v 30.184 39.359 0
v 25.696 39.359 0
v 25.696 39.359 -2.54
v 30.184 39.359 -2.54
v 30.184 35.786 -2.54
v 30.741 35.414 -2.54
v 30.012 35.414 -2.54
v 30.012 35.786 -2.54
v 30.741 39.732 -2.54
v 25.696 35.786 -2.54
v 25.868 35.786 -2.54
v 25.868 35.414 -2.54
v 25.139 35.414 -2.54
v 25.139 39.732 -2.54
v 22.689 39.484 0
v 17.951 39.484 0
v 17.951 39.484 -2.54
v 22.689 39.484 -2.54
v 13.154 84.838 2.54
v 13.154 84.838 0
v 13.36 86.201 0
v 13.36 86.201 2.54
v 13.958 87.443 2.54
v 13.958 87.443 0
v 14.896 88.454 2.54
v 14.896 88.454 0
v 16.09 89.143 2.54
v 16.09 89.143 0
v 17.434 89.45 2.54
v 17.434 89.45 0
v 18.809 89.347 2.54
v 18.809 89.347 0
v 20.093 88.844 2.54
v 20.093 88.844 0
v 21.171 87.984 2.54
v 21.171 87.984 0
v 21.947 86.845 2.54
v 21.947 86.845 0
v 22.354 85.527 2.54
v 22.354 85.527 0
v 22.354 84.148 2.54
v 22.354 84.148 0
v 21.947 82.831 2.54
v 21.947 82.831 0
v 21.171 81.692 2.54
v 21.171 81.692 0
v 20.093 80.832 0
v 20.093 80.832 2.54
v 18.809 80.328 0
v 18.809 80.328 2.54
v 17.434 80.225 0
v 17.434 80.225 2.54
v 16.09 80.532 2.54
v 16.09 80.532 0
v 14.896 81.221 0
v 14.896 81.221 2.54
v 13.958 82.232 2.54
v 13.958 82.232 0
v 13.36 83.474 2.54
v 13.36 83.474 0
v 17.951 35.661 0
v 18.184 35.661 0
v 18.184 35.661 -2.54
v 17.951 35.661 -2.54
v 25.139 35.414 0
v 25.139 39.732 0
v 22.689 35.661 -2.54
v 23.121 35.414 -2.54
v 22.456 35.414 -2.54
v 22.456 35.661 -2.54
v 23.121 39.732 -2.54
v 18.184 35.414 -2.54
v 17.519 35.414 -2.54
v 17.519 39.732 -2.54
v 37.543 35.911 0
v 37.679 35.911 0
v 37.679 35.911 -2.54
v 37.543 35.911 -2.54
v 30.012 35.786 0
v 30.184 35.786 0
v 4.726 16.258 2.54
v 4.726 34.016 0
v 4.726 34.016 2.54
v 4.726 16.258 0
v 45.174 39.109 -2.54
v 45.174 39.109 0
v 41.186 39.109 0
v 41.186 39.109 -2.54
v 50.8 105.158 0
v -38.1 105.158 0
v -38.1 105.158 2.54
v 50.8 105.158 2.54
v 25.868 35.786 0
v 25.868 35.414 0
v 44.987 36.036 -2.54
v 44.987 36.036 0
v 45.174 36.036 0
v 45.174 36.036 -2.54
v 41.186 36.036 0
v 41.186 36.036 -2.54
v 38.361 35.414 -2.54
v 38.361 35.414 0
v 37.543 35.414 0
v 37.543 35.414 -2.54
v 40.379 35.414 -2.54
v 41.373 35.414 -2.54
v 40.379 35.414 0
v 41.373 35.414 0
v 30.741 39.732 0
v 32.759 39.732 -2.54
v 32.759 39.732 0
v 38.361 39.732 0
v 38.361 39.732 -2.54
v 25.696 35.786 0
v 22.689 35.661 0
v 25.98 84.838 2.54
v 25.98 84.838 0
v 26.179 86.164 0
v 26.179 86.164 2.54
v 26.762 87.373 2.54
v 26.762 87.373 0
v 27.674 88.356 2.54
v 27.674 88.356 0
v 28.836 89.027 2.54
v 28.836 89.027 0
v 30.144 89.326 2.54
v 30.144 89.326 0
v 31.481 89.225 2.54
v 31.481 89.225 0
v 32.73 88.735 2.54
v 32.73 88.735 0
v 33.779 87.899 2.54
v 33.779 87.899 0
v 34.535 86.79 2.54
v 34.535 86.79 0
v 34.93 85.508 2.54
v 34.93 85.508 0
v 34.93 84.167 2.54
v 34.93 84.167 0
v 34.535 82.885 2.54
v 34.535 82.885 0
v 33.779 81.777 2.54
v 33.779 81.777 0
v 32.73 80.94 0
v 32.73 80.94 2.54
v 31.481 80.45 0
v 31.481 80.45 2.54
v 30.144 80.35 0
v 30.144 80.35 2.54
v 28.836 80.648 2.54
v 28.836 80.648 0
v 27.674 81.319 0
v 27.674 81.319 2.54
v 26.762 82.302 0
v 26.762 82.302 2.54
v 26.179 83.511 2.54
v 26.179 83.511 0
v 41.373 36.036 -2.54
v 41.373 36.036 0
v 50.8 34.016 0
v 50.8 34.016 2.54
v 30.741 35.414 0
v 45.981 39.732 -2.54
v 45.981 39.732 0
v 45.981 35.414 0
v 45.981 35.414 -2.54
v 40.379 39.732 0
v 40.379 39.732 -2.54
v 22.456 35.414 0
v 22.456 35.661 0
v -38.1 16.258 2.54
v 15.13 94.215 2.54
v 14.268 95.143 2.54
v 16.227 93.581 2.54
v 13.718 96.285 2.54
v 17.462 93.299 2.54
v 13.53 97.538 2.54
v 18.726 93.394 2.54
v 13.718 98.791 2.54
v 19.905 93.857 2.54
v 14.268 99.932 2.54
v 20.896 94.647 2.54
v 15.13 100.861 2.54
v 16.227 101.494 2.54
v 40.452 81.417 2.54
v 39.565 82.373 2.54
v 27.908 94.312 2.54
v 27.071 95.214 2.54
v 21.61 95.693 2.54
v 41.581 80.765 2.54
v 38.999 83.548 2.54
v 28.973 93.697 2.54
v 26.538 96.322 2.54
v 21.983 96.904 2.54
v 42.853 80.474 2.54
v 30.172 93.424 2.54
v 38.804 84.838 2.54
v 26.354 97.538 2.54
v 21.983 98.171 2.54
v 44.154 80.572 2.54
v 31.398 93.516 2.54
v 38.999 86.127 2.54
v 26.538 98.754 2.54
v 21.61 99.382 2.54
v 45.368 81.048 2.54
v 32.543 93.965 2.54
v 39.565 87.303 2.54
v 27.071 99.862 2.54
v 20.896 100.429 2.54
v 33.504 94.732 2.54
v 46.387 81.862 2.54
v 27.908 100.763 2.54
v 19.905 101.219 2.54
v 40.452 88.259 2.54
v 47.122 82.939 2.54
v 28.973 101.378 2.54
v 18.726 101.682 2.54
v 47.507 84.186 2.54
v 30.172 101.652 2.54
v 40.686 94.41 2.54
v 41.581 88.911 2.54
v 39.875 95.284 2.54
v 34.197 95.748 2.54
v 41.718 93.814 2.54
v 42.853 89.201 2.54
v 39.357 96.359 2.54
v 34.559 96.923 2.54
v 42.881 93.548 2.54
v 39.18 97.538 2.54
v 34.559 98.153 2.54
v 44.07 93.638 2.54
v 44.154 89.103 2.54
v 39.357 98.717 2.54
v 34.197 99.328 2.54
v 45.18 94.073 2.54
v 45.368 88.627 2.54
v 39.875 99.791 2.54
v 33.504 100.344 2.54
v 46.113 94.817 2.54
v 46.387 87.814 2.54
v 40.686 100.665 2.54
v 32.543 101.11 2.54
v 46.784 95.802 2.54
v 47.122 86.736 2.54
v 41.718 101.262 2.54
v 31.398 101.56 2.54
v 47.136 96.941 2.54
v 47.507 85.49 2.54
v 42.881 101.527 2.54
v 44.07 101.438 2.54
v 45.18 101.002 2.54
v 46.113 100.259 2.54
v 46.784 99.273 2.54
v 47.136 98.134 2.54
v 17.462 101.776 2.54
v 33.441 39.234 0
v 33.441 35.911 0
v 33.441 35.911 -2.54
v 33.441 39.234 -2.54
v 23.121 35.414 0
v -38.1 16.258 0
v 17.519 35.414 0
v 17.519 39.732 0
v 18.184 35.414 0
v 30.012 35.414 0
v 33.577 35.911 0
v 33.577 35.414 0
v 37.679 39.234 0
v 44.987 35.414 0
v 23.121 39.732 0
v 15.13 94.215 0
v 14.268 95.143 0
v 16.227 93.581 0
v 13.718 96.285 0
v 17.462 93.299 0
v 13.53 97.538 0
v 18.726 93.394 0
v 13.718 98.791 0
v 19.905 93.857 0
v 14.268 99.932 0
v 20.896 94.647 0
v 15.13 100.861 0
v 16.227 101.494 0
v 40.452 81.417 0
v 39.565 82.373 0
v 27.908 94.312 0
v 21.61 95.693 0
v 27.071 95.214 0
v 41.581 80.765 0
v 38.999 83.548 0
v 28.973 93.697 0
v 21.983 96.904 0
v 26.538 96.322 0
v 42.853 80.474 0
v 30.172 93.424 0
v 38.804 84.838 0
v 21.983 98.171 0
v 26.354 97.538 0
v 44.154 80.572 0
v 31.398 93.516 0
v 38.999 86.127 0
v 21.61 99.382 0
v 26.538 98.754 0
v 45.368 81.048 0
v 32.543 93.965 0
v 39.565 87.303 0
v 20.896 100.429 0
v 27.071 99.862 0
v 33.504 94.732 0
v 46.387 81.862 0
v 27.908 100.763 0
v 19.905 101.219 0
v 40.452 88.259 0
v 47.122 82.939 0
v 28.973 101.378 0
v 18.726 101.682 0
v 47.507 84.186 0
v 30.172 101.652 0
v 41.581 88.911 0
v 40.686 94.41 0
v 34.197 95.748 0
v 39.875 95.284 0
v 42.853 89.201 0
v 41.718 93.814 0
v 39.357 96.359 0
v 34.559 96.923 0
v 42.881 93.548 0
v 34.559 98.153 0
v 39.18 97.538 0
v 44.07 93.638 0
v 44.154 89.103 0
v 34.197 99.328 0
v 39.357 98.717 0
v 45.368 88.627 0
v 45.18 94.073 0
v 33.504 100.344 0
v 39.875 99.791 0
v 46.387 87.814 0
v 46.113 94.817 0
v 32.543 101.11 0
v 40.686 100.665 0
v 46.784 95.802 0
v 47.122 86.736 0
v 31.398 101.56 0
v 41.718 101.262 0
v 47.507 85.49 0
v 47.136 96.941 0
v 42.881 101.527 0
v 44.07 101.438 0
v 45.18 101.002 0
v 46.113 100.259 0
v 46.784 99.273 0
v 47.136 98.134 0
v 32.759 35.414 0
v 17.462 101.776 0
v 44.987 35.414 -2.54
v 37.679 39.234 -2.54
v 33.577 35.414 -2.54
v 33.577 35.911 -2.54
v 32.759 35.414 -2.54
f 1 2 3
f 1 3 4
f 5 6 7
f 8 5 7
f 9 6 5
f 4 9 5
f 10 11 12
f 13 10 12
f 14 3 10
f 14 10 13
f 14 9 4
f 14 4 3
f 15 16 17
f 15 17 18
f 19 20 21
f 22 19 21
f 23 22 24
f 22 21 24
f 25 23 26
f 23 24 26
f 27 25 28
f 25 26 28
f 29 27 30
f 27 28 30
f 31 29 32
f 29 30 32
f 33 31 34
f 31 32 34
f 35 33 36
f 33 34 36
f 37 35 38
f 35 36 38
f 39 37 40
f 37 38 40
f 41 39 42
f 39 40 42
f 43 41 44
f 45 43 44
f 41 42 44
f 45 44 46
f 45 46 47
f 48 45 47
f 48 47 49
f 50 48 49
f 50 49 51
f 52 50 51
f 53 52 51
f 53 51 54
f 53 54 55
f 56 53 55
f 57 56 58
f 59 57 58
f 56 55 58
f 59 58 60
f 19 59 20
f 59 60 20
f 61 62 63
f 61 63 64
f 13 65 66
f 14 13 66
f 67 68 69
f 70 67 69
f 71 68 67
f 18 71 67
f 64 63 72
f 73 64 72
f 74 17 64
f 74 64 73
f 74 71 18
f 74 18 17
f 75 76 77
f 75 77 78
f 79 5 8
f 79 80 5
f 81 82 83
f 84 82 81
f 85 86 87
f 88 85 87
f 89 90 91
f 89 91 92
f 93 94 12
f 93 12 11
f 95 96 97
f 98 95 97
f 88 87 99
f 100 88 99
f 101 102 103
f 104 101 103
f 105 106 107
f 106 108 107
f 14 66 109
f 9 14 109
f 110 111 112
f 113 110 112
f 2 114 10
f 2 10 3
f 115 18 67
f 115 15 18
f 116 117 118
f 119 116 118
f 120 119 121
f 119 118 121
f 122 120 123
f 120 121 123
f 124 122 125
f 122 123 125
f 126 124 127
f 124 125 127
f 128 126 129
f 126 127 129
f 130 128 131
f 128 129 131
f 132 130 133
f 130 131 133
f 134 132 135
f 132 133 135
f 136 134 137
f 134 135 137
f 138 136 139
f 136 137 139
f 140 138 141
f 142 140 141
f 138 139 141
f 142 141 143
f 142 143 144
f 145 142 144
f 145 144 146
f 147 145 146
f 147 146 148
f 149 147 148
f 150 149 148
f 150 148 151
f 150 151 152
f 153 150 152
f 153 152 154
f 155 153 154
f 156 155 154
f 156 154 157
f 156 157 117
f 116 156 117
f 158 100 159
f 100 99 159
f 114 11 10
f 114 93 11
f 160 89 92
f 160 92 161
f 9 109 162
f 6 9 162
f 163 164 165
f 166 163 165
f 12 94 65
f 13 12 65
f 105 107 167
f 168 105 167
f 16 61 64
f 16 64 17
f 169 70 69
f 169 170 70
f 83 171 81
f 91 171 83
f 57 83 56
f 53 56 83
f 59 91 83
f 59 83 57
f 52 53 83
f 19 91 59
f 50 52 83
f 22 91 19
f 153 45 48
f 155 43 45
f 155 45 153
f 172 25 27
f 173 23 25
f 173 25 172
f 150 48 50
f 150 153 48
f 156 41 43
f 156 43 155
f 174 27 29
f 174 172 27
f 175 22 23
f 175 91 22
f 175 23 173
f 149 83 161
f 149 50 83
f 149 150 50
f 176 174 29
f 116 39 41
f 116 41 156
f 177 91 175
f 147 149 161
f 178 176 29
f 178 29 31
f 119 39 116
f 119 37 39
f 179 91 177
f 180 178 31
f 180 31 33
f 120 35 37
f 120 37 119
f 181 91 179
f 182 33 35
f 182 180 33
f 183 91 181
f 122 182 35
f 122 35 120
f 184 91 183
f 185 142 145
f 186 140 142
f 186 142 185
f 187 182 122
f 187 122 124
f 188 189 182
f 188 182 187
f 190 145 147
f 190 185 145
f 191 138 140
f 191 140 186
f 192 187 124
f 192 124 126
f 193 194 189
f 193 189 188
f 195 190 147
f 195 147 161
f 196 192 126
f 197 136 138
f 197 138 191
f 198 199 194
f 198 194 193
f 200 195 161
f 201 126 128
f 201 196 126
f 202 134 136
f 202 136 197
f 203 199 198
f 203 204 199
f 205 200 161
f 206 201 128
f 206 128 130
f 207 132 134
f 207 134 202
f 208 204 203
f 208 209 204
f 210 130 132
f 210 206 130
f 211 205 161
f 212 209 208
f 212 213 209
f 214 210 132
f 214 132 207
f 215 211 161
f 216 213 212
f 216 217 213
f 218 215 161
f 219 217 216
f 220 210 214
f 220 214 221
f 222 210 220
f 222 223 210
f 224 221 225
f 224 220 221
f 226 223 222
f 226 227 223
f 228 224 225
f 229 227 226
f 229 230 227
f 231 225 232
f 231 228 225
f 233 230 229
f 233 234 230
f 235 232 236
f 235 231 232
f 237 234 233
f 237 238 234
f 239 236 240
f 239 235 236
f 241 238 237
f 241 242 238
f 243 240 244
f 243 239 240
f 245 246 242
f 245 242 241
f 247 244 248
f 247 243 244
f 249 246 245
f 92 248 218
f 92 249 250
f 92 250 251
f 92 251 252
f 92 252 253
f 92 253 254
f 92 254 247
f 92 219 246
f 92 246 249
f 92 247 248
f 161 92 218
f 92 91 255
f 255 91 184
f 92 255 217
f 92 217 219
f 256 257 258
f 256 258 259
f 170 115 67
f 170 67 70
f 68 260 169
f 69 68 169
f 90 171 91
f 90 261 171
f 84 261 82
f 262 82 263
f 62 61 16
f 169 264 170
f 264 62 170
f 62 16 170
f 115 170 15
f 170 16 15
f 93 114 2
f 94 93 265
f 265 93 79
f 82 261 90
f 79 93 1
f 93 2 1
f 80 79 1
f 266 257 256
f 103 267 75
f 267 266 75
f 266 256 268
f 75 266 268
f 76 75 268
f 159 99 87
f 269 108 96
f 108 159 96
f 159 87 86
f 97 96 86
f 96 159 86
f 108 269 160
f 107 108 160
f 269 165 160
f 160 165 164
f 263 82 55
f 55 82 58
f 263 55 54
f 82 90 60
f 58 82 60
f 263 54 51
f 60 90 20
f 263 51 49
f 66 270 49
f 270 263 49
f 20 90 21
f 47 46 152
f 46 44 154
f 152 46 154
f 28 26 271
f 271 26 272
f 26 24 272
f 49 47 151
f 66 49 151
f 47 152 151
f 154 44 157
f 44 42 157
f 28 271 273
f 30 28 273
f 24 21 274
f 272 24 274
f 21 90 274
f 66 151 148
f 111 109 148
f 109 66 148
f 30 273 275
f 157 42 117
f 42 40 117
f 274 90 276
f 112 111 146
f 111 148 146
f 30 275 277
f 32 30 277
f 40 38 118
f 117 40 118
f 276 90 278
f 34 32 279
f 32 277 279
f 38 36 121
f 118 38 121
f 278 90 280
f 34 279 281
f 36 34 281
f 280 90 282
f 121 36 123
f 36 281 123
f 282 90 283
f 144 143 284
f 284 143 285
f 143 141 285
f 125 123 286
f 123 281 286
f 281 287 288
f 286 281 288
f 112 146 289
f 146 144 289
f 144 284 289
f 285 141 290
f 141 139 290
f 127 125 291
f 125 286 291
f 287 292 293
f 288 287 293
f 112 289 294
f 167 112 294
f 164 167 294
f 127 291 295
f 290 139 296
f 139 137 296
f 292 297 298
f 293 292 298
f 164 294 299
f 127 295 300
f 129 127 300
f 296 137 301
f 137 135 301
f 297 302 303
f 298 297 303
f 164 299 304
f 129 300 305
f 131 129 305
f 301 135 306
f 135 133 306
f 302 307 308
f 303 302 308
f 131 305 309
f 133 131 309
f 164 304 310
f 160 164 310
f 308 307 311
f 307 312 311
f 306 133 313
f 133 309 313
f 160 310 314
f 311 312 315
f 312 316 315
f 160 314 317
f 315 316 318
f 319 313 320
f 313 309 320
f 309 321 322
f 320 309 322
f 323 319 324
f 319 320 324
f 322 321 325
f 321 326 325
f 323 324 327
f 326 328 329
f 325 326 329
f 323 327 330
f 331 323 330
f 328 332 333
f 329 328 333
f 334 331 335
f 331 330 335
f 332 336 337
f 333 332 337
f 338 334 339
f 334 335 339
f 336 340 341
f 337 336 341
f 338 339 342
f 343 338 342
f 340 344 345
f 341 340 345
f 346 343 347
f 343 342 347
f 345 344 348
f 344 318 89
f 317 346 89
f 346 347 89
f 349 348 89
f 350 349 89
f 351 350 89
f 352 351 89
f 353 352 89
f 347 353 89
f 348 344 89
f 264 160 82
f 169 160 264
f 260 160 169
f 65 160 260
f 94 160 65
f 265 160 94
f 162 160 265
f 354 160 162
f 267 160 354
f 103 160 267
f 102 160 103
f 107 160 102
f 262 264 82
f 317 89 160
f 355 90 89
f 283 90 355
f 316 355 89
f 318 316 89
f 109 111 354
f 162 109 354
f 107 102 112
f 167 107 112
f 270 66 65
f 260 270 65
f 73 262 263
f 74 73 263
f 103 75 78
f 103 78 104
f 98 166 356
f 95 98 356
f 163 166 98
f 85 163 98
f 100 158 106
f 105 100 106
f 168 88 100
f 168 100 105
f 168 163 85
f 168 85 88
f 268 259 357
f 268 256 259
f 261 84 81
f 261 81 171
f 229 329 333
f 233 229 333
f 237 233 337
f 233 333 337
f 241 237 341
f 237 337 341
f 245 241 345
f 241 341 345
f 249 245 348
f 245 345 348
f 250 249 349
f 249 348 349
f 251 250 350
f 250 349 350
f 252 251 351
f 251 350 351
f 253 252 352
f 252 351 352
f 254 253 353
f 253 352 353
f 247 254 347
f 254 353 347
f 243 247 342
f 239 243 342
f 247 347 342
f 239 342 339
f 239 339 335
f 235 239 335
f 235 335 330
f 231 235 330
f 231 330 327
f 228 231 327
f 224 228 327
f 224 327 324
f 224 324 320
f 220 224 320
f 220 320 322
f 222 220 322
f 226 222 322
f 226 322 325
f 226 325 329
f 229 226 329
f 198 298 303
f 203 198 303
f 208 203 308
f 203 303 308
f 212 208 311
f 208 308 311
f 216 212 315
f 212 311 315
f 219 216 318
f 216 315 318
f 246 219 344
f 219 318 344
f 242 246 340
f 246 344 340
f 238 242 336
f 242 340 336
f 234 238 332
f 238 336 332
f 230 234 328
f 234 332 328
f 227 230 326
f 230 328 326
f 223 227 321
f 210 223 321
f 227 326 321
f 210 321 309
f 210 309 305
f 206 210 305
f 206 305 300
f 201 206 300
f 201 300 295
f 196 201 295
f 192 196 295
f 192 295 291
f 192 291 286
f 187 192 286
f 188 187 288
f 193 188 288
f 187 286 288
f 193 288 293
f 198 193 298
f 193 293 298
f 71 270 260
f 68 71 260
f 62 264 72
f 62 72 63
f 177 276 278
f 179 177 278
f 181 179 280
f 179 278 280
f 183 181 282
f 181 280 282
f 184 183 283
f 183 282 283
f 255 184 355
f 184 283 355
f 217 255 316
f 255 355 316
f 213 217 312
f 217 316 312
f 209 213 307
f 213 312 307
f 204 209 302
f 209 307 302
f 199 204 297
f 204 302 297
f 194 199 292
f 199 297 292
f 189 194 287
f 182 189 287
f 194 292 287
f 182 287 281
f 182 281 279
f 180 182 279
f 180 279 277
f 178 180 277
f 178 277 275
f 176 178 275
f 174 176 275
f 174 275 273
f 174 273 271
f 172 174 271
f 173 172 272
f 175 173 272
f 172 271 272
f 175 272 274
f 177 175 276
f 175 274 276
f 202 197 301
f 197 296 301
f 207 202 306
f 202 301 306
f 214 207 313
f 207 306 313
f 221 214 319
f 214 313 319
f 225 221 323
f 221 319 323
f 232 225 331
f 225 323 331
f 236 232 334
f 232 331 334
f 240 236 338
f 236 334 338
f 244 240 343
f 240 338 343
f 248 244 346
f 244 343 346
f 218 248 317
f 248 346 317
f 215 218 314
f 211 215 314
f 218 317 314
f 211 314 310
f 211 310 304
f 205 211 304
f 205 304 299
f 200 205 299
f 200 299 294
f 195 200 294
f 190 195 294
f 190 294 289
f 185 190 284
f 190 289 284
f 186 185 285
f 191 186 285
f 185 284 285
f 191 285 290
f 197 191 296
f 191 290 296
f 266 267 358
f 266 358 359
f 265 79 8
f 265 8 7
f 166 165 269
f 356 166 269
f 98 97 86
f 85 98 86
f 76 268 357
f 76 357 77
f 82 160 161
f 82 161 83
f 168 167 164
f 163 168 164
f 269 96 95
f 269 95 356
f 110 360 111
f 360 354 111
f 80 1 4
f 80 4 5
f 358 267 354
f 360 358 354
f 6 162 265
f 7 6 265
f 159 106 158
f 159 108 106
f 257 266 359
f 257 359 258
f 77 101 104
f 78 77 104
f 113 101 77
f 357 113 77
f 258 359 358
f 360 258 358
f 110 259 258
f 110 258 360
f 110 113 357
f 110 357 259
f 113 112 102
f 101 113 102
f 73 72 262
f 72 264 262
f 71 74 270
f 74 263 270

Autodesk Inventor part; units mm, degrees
ref_plane "YZ Plane" through (0, 0, 0) normal (1, 0, 0) x (0, 1, 0)
ref_plane "XZ Plane" through (0, 0, 0) normal (0, 1, 0) x (-1, 0, 0)
ref_plane "XY Plane" through (0, 0, 0) normal (0, 0, 1) x (1, 0, 0)
sketch "Sketch2" plane through (0, 0, 0) normal (0, 0, 1) x (1, 0, 0)
  line L0 (-38.1, 105.1577) -> (50.8, 105.1577)
  line L1 (50.8, 105.1577) -> (50.8, 16.2577)
  line L2 (50.8, 16.2577) -> (-38.1, 16.2577)
  line L3 (-38.1, 16.2577) -> (-38.1, 105.1577)
  point P0 (0, 0)
  dimension "d45" = 88.9
  dimension "d46" = 88.9
extrude "Extrusion1" add sketch "Sketch2" along normal blind 2.54
sketch "Sketch3" plane through (0, 0, 0) normal (0, 0, -1) x (-1, 0, 0)
  circle A0 centre (-43.18, 97.5377) radius 4.0005
  line L0 (-50.8, 16.2577) -> (-50.8, 105.1577) projected
  line L1 (-50.8, 105.1577) -> (38.1, 105.1577) projected
  circle A1 centre (-43.18, 97.5377) radius 5.2705
  line L2 (38.1, 105.1577) -> (38.1, 16.2577) projected
  line L3 (38.1, 16.2577) -> (-50.8, 16.2577) projected
  circle A2 centre (-43.18, 84.8377) radius 5.2705
  circle A3 centre (-30.48, 97.5377) radius 5.2705
  circle A4 centre (-30.48, 84.8377) radius 5.2705
  circle A5 centre (-17.78, 97.5377) radius 5.2705
  circle A6 centre (-17.78, 84.8377) radius 5.2705
  line L4 (-45.1739, 77.2092) -> (-41.1861, 77.2092)
  line L5 (-41.1861, 77.2092) -> (-41.1861, 74.1358)
  line L6 (-41.1861, 74.1358) -> (-45.1739, 74.1358)
  line L7 (-45.1739, 74.1358) -> (-45.1739, 77.2092)
  line L8 (-45.1739, 77.2092) -> (-41.1861, 74.1358) construction
  line L9 (-41.1861, 77.2092) -> (-45.1739, 74.1358) construction
  line L10 (-45.9813, 73.5135) -> (-40.3787, 73.5135)
  line L11 (-40.3787, 73.5135) -> (-40.3787, 77.8315)
  line L12 (-40.3787, 77.8315) -> (-45.9813, 77.8315)
  line L13 (-45.9813, 77.8315) -> (-45.9813, 73.5135)
  line L14 (-45.9813, 73.5135) -> (-40.3787, 77.8315) construction
  line L15 (-40.3787, 73.5135) -> (-45.9813, 77.8315) construction
  circle A7 centre (-30.48, 97.5377) radius 4.1255
  circle A8 centre (-17.78, 97.5377) radius 4.2505
  circle A9 centre (-43.18, 84.8377) radius 4.3755
  circle A10 centre (-30.48, 84.8377) radius 4.5005
  circle A11 centre (-17.78, 84.8377) radius 4.6255
  line L16 (-32.7587, 77.8315) -> (-38.3613, 77.8315)
  line L17 (-38.3613, 77.8315) -> (-38.3613, 73.5135)
  line L18 (-38.3613, 73.5135) -> (-32.7587, 73.5135)
  line L19 (-32.7587, 73.5135) -> (-32.7587, 77.8315)
  line L20 (-25.1387, 77.8315) -> (-30.7413, 77.8315)
  line L21 (-30.7413, 77.8315) -> (-30.7413, 73.5135)
  line L22 (-30.7413, 73.5135) -> (-25.1387, 73.5135)
  line L23 (-25.1387, 73.5135) -> (-25.1387, 77.8315)
  line L24 (-17.5187, 77.8315) -> (-23.1213, 77.8315)
  line L25 (-23.1213, 77.8315) -> (-23.1213, 73.5135)
  line L26 (-23.1213, 73.5135) -> (-17.5187, 73.5135)
  line L27 (-17.5187, 73.5135) -> (-17.5187, 77.8315)
  line L28 (-9.8987, 77.8315) -> (-15.5013, 77.8315)
  line L29 (-15.5013, 77.8315) -> (-15.5013, 73.5135)
  line L30 (-15.5013, 73.5135) -> (-9.8987, 73.5135)
  line L31 (-9.8987, 73.5135) -> (-9.8987, 77.8315)
  line L32 (-37.6789, 74.0108) -> (-33.4411, 74.0108)
  line L33 (-33.4411, 74.0108) -> (-33.4411, 77.3342)
  line L34 (-33.4411, 77.3342) -> (-37.6789, 77.3342)
  line L35 (-37.6789, 77.3342) -> (-37.6789, 74.0108)
  line L36 (-37.6789, 74.0108) -> (-33.4411, 77.3342) construction
  line L37 (-33.4411, 74.0108) -> (-37.6789, 77.3342) construction
  line L38 (-30.1839, 73.8858) -> (-25.6961, 73.8858)
  line L39 (-25.6961, 73.8858) -> (-25.6961, 77.4592)
  line L40 (-25.6961, 77.4592) -> (-30.1839, 77.4592)
  line L41 (-30.1839, 77.4592) -> (-30.1839, 73.8858)
  line L42 (-30.1839, 73.8858) -> (-25.6961, 77.4592) construction
  line L43 (-25.6961, 73.8858) -> (-30.1839, 77.4592) construction
  line L44 (-22.6889, 73.7608) -> (-17.9511, 73.7608)
  line L45 (-17.9511, 73.7608) -> (-17.9511, 77.5842)
  line L46 (-17.9511, 77.5842) -> (-22.6889, 77.5842)
  line L47 (-22.6889, 77.5842) -> (-22.6889, 73.7608)
  line L48 (-22.6889, 73.7608) -> (-17.9511, 77.5842) construction
  line L49 (-17.9511, 73.7608) -> (-22.6889, 77.5842) construction
  line L50 (-45.1739, 73.4552) -> (-41.1861, 73.4552)
  line L51 (-41.1861, 73.4552) -> (-41.1861, 74.8164)
  line L52 (-41.1861, 74.8164) -> (-45.1739, 74.8164)
  line L53 (-45.1739, 74.8164) -> (-45.1739, 73.4552)
  line L54 (-45.1739, 73.4552) -> (-41.1861, 74.8164) construction
  line L55 (-41.1861, 73.4552) -> (-45.1739, 74.8164) construction
  point P0 (0, 0)
  point P1 (-43.18, 75.6725)
  point P2 (-43.18, 75.6725)
  point P3 (-35.56, 75.6725)
  point P4 (-27.94, 75.6725)
  point P5 (-20.32, 75.6725)
  point P6 (-12.7, 75.6725)
  point P7 (-43.18, 74.1358)
  dimension "d49" = 7.62
  dimension "d50" = 7.62
  dimension "d51" = 1.27
  dimension "d56" = 12.7
  dimension "d59" = 12.7
  dimension "d64" = 3.9878
  dimension "d65" = 3.0734
  dimension "d66" = 9.1652
  dimension "d67" = 2.159
  dimension "d77" = 8.001
  dimension "d78" = 8.251
  dimension "d80" = 8.501
  dimension "d81" = 8.751
  dimension "d82" = 9.001
  dimension "d83" = 9.251
  dimension "d90" = 7.62
  dimension "d95" = 4.2378
  dimension "d96" = 4.4878
  dimension "d97" = 4.7378
  dimension "d98" = 3.3234
  dimension "d99" = 3.5734
sketch "Sketch4" plane through (0, 0, 0) normal (0, 0, -1) x (-1, 0, 0)
  line L0 (-50.8, 105.1577) -> (38.1, 105.1577) projected
  line L1 (-50.8, 16.2577) -> (-50.8, 105.1577) projected
  line L2 (-50.8, 105.1577) -> (-48.5295, 105.1577)
  line L3 (-48.5295, 105.1577) -> (-48.5295, 103.1024)
  line L4 (-48.5295, 103.1024) -> (-50.8, 103.1024)
  line L5 (-50.8, 103.1024) -> (-50.8, 105.1577)
  point P0 (0, 0)
extrude "Extrusion4" cut sketch "Sketch3" against normal blind 9.001 contours A0 | A7 | A8 | A9 | A10 | A11
sketch "Sketch5" plane through (0, 0, 0) normal (0, 0, -1) x (-1, 0, 0)
  line L0 (-45.1739, 39.1092) -> (-41.1861, 39.1092)
  line L1 (-41.1861, 39.1092) -> (-41.1861, 36.0358)
  line L2 (-41.1861, 36.0358) -> (-45.1739, 36.0358)
  line L3 (-45.1739, 36.0358) -> (-45.1739, 39.1092)
  line L4 (-45.1739, 39.1092) -> (-41.1861, 36.0358) construction
  line L5 (-41.1861, 39.1092) -> (-45.1739, 36.0358) construction
  line L6 (-45.9813, 35.4135) -> (-40.3787, 35.4135)
  line L7 (-40.3787, 35.4135) -> (-40.3787, 39.7315)
  line L8 (-40.3787, 39.7315) -> (-45.9813, 39.7315)
  line L9 (-45.9813, 39.7315) -> (-45.9813, 35.4135)
  line L10 (-45.9813, 35.4135) -> (-40.3787, 39.7315) construction
  line L11 (-40.3787, 35.4135) -> (-45.9813, 39.7315) construction
  line L12 (-32.7587, 39.7315) -> (-38.3613, 39.7315)
  line L13 (-38.3613, 39.7315) -> (-38.3613, 35.4135)
  line L14 (-38.3613, 35.4135) -> (-32.7587, 35.4135)
  line L15 (-32.7587, 35.4135) -> (-32.7587, 39.7315)
  line L16 (-25.1387, 39.7315) -> (-30.7413, 39.7315)
  line L17 (-30.7413, 39.7315) -> (-30.7413, 35.4135)
  line L18 (-30.7413, 35.4135) -> (-25.1387, 35.4135)
  line L19 (-25.1387, 35.4135) -> (-25.1387, 39.7315)
  line L20 (-17.5187, 39.7315) -> (-23.1213, 39.7315)
  line L21 (-23.1213, 39.7315) -> (-23.1213, 35.4135)
  line L22 (-23.1213, 35.4135) -> (-17.5187, 35.4135)
  line L23 (-17.5187, 35.4135) -> (-17.5187, 39.7315)
  line L24 (-9.8987, 39.7315) -> (-15.5013, 39.7315)
  line L25 (-15.5013, 39.7315) -> (-15.5013, 35.4135)
  line L26 (-15.5013, 35.4135) -> (-9.8987, 35.4135)
  line L27 (-37.6789, 35.9108) -> (-33.4411, 35.9108)
  line L28 (-33.4411, 35.9108) -> (-33.4411, 39.2342)
  line L29 (-33.4411, 39.2342) -> (-37.6789, 39.2342)
  line L30 (-37.6789, 39.2342) -> (-37.6789, 35.9108)
  line L31 (-37.6789, 35.9108) -> (-33.4411, 39.2342) construction
  line L32 (-33.4411, 35.9108) -> (-37.6789, 39.2342) construction
  line L33 (-30.1839, 35.7858) -> (-25.6961, 35.7858)
  line L34 (-25.6961, 35.7858) -> (-25.6961, 39.3592)
  line L35 (-25.6961, 39.3592) -> (-30.1839, 39.3592)
  line L36 (-30.1839, 39.3592) -> (-30.1839, 35.7858)
  line L37 (-30.1839, 35.7858) -> (-25.6961, 39.3592) construction
  line L38 (-25.6961, 35.7858) -> (-30.1839, 39.3592) construction
  line L39 (-22.6889, 35.6608) -> (-17.9511, 35.6608)
  line L40 (-17.9511, 35.6608) -> (-17.9511, 39.4842)
  line L41 (-17.9511, 39.4842) -> (-22.6889, 39.4842)
  line L42 (-22.6889, 39.4842) -> (-22.6889, 35.6608)
  line L43 (-22.6889, 35.6608) -> (-17.9511, 39.4842) construction
  line L44 (-17.9511, 35.6608) -> (-22.6889, 39.4842) construction
  line L45 (-45.1516, 35.2931) -> (-41.1861, 36.7869) construction
  line L46 (-41.1861, 35.3552) -> (-45.1739, 36.7164) construction
  line L47 (-44.9867, 35.3552) -> (-41.3733, 35.3552)
  line L48 (-41.3733, 35.3552) -> (-41.3733, 36.7164)
  line L49 (-41.3733, 36.7164) -> (-44.9867, 36.7164)
  line L50 (-44.9867, 36.7164) -> (-44.9867, 35.3552)
  line L51 (-44.9867, 35.3552) -> (-41.3733, 36.7164) construction
  line L52 (-41.3733, 35.3552) -> (-44.9867, 36.7164) construction
  line L53 (-37.5427, 35.3747) -> (-33.5773, 35.3747)
  line L54 (-33.5773, 35.3747) -> (-33.5773, 36.447)
  line L55 (-33.5773, 36.447) -> (-37.5427, 36.447)
  line L56 (-37.5427, 36.447) -> (-37.5427, 35.3747)
  line L57 (-37.5427, 35.3747) -> (-33.5773, 36.447) construction
  line L58 (-33.5773, 35.3747) -> (-37.5427, 36.447) construction
  line L59 (-30.0124, 35.3468) -> (-25.8676, 35.3468)
  line L60 (-25.8676, 35.3468) -> (-25.8676, 36.2248)
  line L61 (-25.8676, 36.2248) -> (-30.0124, 36.2248)
  line L62 (-30.0124, 36.2248) -> (-30.0124, 35.3468)
  line L63 (-30.0124, 35.3468) -> (-25.8676, 36.2248) construction
  line L64 (-25.8676, 35.3468) -> (-30.0124, 36.2248) construction
  line L65 (-22.4558, 35.2013) -> (-18.1842, 35.2013)
  line L66 (-18.1842, 35.2013) -> (-18.1842, 36.1203)
  line L67 (-18.1842, 36.1203) -> (-22.4558, 36.1203)
  line L68 (-22.4558, 36.1203) -> (-22.4558, 35.2013)
  line L69 (-22.4558, 35.2013) -> (-18.1842, 36.1203) construction
  line L70 (-18.1842, 35.2013) -> (-22.4558, 36.1203) construction
  point P0 (0, 0)
  point P1 (-43.18, 37.5725)
  point P2 (-43.18, 37.5725)
  point P3 (-35.56, 37.5725)
  point P4 (-27.94, 37.5725)
  point P5 (-20.32, 37.5725)
  point P6 (-12.7, 37.5725)
  point P7 (-43.18, 36.0358)
  point P8 (-35.56, 35.9108)
  point P9 (-27.94, 35.7858)
  point P10 (-20.32, 35.6608)
  point P11 (-22.4558, 35.4135)
  point P12 (-22.4558, 35.6608)
  point P13 (-18.1842, 35.6608)
  point P14 (-18.1842, 35.4135)
  point P15 (-30.0124, 35.4135)
  point P16 (-30.0124, 35.7858)
  point P17 (-25.8676, 35.7858)
  point P18 (-25.8676, 35.4135)
  point P19 (-37.5427, 35.4135)
  point P20 (-37.5427, 35.9108)
  point P21 (-33.5773, 35.9108)
  point P22 (-33.5773, 35.4135)
  point P23 (-44.9867, 35.4135)
  point P24 (-44.9867, 36.0358)
  point P25 (-41.3733, 36.0358)
  point P26 (-41.3733, 35.4135)
  dimension "d102" = 3.0734
  dimension "d103" = 2.159
  dimension "d104" = 7.62
  dimension "d105" = 4.2378
  dimension "d106" = 4.4878
  dimension "d107" = 4.7378
  dimension "d108" = 3.3234
  dimension "d109" = 3.5734
extrude "Extrusion5" add sketch "Sketch5" along normal blind 2.54 contours L3 L2 L50 L6 L9 L8 L7 L48 L1 L0 | L15 L14 L54 L27 L28 L29 L30 L56 L13 L12 | L19 L18 L60 L33 L34 L35 L36 L62 L17 L16 | L23 L22 L66 L39 L40 L41 L42 L68 L21 L20
sketch "Sketch6" plane through (0, 0, 0) normal (0, 0, -1) x (-1, 0, 0)
  line L0 (-52.3953, 34.0161) -> (-4.7261, 34.0161)
  line L1 (-4.7261, 34.0161) -> (-4.7261, 12.2528)
  line L2 (-4.7261, 12.2528) -> (-52.3953, 12.2528)
  line L3 (-52.3953, 12.2528) -> (-52.3953, 34.0161)
  point P0 (0, 0)
extrude "Extrusion6" cut sketch "Sketch6" against normal blind 2.54
sketch "Sketch7" plane through (0, 0, 0) normal (0, 0, -1) x (-1, 0, 0)
  point P0 (0, 0)
equation "\"d86\" = d82"
properties part number "magnet_hall_testing_w_trucks"
